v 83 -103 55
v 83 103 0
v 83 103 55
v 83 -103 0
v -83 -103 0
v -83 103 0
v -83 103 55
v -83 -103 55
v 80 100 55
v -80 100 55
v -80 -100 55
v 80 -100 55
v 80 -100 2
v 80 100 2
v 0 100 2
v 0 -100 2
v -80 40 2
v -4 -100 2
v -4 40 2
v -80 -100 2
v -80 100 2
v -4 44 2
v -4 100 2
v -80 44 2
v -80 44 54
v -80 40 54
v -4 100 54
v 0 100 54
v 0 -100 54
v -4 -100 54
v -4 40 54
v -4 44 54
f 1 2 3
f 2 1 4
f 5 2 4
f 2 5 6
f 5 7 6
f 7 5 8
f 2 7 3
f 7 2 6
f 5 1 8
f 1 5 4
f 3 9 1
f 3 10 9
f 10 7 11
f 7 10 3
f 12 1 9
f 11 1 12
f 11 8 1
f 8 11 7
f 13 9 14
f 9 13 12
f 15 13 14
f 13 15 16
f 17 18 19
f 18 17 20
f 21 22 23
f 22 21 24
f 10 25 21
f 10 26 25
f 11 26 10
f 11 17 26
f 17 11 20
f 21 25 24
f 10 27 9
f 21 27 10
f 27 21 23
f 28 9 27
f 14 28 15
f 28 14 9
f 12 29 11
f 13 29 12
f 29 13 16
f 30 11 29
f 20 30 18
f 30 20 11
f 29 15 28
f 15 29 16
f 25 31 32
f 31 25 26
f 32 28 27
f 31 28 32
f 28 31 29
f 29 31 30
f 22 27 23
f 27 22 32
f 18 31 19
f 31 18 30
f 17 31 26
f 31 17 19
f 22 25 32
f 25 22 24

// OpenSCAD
// file: BOSL2/std.scad
// Minimal BOSL2 compatibility shim for bundled gallery models.
// It implements only the helpers used by the imported OpenSCAD projects.

CENTER = [0, 0, 0];
BOTTOM = [0, 0, -1];
TOP = [0, 0, 1];
LEFT = [-1, 0, 0];
RIGHT = [1, 0, 0];
FRONT = [0, -1, 0];
BACK = [0, 1, 0];

module up(z=0) {
    translate([0, 0, z]) children();
}

module down(z=0) {
    translate([0, 0, -z]) children();
}

module attach(anchor=CENTER) {
    children();
}

module cuboid(size=[1, 1, 1], anchor=CENTER) {
    center = anchor == CENTER;
    translate(center ? [0, 0, 0] : [0, 0, size[2] / 2])
        cube(size, center=true);
    children();
}

module xcyl(h=1, r=1, anchor=CENTER) {
    center = anchor == CENTER;
    translate(center ? [0, 0, 0] : [h / 2, 0, 0])
        rotate([0, 90, 0])
            cylinder(h=h, r=r, center=true);
}
// main file
include <BOSL2/std.scad>

//difference(){

union()
{
    difference()
    {
        //box
        translate([0,0,30])
        {
            difference()
            { 
                difference() 
                {
                    //basic shape
                    cuboid([166,206,60], rounding=6);
                    //cut the top open
                    translate ([0,0,55]) cuboid ([166,206,60]);
                }
                //hollow the interior
                cuboid ([160,200,56], rounding = 6);
            }
        }   
    }
    //divider
    translate([-4,-100,2]) cube([4, 200, 52]);
    rotate ([00,0,90]) translate([40,0,2]) cube ([4,80,52]);
}

//rotate ([0,0,90]) translate([85,-160,2]) cube([400,400,200]);
//}
//lid definition
/*rotate([0,180,0]) translate([0,0,-72.5]) 
    difference(){
        difference()
        {
            difference() 
            {
                //basic shape
                cuboid([175,225,65], rounding=6);
                //cut the top open
                translate ([0,0,55]) cuboid ([175,225,60]);
            }
            //hollow the interior
            cuboid ([165,215,60], rounding = 6);
        }
        translate ([0,0,20]) cuboid ([170,220,12], rounding = 6, edges="Z");
    }
}*/
